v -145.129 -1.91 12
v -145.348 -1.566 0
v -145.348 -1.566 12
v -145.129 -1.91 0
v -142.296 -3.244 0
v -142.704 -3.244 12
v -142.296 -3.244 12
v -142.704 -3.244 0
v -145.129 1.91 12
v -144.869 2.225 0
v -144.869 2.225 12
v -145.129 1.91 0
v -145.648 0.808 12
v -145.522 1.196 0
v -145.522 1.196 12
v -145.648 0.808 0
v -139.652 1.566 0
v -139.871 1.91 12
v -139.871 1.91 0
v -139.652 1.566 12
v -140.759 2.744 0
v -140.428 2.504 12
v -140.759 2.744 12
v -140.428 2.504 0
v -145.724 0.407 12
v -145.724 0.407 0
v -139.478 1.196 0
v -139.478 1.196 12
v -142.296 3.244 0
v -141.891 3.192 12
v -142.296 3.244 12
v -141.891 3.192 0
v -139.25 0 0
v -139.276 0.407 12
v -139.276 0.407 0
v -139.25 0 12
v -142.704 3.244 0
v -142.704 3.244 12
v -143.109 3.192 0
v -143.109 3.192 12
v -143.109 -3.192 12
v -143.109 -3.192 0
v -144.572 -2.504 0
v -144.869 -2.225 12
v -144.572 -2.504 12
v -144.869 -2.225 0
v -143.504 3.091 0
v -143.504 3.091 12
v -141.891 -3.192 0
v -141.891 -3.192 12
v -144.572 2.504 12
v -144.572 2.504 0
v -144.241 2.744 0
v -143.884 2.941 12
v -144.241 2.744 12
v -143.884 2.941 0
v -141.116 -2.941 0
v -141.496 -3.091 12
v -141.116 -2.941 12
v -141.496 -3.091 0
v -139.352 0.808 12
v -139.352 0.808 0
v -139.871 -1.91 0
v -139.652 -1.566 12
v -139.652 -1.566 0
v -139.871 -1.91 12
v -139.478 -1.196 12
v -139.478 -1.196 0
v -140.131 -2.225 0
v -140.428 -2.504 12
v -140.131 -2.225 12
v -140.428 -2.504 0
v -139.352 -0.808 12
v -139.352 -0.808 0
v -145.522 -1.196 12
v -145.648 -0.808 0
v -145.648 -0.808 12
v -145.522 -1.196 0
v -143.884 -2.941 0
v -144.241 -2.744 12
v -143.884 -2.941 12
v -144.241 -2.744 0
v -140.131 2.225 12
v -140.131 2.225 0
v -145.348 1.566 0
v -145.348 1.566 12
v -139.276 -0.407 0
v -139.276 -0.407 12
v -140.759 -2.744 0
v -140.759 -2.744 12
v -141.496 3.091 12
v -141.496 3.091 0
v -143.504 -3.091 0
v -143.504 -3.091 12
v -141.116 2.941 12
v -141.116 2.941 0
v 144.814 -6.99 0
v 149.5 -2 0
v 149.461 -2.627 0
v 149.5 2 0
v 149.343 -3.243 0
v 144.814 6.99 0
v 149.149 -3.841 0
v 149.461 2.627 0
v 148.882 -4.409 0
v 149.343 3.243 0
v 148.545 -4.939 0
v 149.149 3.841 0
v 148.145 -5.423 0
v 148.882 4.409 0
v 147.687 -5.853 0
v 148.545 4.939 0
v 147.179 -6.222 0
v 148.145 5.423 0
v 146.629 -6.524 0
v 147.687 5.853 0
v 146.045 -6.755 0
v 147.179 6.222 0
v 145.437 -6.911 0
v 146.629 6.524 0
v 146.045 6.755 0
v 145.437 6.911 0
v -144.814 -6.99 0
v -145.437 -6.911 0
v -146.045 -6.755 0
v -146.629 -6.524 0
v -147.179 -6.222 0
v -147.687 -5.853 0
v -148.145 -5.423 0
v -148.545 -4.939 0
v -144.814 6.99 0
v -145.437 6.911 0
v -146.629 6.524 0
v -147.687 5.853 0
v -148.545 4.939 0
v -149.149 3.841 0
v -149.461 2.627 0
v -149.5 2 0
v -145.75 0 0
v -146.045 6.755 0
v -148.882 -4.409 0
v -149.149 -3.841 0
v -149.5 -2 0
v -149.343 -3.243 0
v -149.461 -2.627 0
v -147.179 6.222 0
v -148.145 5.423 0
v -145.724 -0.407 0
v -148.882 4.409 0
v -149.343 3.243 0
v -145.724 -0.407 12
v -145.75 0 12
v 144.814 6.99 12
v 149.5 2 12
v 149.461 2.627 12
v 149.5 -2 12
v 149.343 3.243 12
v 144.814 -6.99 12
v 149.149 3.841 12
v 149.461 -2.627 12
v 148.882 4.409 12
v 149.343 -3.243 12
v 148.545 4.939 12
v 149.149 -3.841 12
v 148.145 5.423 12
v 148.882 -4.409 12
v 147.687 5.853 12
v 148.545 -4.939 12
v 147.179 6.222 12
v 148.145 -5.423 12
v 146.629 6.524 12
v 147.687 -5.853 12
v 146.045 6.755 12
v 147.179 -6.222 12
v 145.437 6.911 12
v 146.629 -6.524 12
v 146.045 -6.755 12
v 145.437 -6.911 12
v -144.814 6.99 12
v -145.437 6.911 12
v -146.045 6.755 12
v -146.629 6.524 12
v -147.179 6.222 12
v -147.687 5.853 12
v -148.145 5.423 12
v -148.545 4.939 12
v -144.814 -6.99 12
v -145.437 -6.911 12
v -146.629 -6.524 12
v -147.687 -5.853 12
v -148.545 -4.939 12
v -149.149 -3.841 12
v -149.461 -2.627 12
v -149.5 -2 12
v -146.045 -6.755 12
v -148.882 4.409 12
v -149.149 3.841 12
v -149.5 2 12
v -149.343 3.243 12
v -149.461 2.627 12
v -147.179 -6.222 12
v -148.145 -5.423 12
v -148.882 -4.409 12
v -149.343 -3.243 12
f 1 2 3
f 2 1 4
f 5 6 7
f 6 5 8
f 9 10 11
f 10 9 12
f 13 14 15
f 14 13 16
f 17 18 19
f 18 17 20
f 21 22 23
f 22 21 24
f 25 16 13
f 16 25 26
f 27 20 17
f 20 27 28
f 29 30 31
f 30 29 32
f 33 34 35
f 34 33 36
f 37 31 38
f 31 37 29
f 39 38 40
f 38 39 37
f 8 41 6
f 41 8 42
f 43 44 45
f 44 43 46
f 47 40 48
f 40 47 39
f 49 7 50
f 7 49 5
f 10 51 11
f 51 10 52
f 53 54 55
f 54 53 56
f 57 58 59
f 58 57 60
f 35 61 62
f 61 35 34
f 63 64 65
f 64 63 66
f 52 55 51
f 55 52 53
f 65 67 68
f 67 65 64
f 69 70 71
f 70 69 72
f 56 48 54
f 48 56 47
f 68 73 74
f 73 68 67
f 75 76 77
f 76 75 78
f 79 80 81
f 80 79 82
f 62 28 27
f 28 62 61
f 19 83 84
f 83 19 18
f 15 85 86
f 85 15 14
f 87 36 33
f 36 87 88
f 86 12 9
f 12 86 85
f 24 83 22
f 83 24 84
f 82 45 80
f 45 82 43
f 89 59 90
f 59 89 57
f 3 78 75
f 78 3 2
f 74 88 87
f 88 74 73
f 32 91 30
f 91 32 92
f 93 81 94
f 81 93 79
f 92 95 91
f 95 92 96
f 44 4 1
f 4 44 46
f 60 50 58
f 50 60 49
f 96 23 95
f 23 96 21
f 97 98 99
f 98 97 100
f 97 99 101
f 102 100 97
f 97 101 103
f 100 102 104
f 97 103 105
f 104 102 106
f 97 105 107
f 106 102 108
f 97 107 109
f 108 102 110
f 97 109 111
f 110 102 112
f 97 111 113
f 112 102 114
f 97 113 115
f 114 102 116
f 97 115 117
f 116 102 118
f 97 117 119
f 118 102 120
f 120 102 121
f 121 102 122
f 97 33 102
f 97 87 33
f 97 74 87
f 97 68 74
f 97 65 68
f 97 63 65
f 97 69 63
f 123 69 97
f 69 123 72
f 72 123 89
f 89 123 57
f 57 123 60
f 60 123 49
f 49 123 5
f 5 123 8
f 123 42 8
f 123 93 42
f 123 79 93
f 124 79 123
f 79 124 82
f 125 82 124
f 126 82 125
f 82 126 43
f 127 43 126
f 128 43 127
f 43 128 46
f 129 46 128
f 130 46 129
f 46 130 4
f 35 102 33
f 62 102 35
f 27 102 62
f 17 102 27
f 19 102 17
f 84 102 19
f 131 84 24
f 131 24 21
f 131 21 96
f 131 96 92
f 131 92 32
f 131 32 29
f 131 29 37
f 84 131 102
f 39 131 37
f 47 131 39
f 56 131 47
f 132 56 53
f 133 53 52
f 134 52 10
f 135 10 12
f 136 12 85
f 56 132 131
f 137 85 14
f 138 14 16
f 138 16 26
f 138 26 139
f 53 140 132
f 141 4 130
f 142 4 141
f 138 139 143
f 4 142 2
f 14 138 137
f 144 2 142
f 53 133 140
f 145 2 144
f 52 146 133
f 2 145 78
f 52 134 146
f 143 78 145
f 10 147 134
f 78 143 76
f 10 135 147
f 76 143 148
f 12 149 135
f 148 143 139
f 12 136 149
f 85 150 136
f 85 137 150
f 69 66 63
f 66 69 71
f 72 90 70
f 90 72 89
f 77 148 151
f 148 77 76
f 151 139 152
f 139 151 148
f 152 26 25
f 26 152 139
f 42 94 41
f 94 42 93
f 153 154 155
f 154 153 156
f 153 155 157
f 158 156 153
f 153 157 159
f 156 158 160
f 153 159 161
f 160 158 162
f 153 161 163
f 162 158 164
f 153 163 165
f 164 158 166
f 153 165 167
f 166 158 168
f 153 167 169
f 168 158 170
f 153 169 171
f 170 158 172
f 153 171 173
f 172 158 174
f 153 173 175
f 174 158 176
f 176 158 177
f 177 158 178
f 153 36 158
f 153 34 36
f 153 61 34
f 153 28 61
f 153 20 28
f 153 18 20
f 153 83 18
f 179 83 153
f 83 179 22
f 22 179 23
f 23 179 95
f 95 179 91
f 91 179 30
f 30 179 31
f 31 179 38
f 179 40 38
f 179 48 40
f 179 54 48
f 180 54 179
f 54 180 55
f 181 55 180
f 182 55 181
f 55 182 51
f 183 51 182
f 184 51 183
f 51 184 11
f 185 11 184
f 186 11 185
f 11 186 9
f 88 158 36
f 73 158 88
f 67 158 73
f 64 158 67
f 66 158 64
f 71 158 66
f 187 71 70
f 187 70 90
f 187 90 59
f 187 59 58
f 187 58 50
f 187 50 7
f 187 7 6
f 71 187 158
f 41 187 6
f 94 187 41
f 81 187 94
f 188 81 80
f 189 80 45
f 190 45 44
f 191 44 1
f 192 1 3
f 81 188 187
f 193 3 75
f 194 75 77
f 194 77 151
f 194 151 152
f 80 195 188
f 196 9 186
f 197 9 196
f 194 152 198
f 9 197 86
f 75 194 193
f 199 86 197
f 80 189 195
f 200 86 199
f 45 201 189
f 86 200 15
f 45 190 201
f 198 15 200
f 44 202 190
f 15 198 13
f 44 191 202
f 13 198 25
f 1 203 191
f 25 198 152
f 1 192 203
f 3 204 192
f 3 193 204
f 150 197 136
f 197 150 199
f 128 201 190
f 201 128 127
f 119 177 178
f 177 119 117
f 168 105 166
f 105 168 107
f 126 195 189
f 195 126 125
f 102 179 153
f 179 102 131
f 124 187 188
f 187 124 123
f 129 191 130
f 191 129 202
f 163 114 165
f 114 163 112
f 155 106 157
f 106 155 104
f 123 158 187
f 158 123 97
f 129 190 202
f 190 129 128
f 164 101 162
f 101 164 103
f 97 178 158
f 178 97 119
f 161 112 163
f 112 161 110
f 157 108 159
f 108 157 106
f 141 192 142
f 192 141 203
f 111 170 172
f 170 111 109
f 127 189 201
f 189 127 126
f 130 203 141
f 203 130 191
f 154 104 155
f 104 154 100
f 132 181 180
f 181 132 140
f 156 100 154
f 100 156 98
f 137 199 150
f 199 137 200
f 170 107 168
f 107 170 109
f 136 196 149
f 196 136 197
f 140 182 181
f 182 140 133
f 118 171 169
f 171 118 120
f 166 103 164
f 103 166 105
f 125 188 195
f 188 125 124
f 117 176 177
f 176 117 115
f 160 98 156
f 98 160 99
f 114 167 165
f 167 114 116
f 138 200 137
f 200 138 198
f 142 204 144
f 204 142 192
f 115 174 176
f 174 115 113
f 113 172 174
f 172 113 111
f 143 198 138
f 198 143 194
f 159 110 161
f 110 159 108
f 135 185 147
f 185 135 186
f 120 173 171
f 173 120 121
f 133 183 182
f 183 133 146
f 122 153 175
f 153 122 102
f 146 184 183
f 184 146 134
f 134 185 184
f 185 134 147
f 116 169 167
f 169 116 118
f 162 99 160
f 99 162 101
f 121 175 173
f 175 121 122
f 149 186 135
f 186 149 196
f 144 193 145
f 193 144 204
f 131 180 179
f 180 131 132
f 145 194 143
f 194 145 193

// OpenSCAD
$fn = 50;


difference() {
	union() {
		hull() {
			translate(v = [-144.5000000000, 2.0000000000, 0]) {
				cylinder(h = 12, r = 5);
			}
			translate(v = [144.5000000000, 2.0000000000, 0]) {
				cylinder(h = 12, r = 5);
			}
			translate(v = [-144.5000000000, -2.0000000000, 0]) {
				cylinder(h = 12, r = 5);
			}
			translate(v = [144.5000000000, -2.0000000000, 0]) {
				cylinder(h = 12, r = 5);
			}
		}
	}
	union() {
		translate(v = [-142.5000000000, 0.0000000000, 0]) {
			cylinder(h = 12, r = 3.2500000000);
		}
		translate(v = [-142.5000000000, 0.0000000000, 0]) {
			cylinder(h = 12, r = 1.8000000000);
		}
		translate(v = [-142.5000000000, 0.0000000000, 0]) {
			cylinder(h = 12, r = 1.8000000000);
		}
		translate(v = [-142.5000000000, 0.0000000000, 0]) {
			cylinder(h = 12, r = 1.8000000000);
		}
	}
}
